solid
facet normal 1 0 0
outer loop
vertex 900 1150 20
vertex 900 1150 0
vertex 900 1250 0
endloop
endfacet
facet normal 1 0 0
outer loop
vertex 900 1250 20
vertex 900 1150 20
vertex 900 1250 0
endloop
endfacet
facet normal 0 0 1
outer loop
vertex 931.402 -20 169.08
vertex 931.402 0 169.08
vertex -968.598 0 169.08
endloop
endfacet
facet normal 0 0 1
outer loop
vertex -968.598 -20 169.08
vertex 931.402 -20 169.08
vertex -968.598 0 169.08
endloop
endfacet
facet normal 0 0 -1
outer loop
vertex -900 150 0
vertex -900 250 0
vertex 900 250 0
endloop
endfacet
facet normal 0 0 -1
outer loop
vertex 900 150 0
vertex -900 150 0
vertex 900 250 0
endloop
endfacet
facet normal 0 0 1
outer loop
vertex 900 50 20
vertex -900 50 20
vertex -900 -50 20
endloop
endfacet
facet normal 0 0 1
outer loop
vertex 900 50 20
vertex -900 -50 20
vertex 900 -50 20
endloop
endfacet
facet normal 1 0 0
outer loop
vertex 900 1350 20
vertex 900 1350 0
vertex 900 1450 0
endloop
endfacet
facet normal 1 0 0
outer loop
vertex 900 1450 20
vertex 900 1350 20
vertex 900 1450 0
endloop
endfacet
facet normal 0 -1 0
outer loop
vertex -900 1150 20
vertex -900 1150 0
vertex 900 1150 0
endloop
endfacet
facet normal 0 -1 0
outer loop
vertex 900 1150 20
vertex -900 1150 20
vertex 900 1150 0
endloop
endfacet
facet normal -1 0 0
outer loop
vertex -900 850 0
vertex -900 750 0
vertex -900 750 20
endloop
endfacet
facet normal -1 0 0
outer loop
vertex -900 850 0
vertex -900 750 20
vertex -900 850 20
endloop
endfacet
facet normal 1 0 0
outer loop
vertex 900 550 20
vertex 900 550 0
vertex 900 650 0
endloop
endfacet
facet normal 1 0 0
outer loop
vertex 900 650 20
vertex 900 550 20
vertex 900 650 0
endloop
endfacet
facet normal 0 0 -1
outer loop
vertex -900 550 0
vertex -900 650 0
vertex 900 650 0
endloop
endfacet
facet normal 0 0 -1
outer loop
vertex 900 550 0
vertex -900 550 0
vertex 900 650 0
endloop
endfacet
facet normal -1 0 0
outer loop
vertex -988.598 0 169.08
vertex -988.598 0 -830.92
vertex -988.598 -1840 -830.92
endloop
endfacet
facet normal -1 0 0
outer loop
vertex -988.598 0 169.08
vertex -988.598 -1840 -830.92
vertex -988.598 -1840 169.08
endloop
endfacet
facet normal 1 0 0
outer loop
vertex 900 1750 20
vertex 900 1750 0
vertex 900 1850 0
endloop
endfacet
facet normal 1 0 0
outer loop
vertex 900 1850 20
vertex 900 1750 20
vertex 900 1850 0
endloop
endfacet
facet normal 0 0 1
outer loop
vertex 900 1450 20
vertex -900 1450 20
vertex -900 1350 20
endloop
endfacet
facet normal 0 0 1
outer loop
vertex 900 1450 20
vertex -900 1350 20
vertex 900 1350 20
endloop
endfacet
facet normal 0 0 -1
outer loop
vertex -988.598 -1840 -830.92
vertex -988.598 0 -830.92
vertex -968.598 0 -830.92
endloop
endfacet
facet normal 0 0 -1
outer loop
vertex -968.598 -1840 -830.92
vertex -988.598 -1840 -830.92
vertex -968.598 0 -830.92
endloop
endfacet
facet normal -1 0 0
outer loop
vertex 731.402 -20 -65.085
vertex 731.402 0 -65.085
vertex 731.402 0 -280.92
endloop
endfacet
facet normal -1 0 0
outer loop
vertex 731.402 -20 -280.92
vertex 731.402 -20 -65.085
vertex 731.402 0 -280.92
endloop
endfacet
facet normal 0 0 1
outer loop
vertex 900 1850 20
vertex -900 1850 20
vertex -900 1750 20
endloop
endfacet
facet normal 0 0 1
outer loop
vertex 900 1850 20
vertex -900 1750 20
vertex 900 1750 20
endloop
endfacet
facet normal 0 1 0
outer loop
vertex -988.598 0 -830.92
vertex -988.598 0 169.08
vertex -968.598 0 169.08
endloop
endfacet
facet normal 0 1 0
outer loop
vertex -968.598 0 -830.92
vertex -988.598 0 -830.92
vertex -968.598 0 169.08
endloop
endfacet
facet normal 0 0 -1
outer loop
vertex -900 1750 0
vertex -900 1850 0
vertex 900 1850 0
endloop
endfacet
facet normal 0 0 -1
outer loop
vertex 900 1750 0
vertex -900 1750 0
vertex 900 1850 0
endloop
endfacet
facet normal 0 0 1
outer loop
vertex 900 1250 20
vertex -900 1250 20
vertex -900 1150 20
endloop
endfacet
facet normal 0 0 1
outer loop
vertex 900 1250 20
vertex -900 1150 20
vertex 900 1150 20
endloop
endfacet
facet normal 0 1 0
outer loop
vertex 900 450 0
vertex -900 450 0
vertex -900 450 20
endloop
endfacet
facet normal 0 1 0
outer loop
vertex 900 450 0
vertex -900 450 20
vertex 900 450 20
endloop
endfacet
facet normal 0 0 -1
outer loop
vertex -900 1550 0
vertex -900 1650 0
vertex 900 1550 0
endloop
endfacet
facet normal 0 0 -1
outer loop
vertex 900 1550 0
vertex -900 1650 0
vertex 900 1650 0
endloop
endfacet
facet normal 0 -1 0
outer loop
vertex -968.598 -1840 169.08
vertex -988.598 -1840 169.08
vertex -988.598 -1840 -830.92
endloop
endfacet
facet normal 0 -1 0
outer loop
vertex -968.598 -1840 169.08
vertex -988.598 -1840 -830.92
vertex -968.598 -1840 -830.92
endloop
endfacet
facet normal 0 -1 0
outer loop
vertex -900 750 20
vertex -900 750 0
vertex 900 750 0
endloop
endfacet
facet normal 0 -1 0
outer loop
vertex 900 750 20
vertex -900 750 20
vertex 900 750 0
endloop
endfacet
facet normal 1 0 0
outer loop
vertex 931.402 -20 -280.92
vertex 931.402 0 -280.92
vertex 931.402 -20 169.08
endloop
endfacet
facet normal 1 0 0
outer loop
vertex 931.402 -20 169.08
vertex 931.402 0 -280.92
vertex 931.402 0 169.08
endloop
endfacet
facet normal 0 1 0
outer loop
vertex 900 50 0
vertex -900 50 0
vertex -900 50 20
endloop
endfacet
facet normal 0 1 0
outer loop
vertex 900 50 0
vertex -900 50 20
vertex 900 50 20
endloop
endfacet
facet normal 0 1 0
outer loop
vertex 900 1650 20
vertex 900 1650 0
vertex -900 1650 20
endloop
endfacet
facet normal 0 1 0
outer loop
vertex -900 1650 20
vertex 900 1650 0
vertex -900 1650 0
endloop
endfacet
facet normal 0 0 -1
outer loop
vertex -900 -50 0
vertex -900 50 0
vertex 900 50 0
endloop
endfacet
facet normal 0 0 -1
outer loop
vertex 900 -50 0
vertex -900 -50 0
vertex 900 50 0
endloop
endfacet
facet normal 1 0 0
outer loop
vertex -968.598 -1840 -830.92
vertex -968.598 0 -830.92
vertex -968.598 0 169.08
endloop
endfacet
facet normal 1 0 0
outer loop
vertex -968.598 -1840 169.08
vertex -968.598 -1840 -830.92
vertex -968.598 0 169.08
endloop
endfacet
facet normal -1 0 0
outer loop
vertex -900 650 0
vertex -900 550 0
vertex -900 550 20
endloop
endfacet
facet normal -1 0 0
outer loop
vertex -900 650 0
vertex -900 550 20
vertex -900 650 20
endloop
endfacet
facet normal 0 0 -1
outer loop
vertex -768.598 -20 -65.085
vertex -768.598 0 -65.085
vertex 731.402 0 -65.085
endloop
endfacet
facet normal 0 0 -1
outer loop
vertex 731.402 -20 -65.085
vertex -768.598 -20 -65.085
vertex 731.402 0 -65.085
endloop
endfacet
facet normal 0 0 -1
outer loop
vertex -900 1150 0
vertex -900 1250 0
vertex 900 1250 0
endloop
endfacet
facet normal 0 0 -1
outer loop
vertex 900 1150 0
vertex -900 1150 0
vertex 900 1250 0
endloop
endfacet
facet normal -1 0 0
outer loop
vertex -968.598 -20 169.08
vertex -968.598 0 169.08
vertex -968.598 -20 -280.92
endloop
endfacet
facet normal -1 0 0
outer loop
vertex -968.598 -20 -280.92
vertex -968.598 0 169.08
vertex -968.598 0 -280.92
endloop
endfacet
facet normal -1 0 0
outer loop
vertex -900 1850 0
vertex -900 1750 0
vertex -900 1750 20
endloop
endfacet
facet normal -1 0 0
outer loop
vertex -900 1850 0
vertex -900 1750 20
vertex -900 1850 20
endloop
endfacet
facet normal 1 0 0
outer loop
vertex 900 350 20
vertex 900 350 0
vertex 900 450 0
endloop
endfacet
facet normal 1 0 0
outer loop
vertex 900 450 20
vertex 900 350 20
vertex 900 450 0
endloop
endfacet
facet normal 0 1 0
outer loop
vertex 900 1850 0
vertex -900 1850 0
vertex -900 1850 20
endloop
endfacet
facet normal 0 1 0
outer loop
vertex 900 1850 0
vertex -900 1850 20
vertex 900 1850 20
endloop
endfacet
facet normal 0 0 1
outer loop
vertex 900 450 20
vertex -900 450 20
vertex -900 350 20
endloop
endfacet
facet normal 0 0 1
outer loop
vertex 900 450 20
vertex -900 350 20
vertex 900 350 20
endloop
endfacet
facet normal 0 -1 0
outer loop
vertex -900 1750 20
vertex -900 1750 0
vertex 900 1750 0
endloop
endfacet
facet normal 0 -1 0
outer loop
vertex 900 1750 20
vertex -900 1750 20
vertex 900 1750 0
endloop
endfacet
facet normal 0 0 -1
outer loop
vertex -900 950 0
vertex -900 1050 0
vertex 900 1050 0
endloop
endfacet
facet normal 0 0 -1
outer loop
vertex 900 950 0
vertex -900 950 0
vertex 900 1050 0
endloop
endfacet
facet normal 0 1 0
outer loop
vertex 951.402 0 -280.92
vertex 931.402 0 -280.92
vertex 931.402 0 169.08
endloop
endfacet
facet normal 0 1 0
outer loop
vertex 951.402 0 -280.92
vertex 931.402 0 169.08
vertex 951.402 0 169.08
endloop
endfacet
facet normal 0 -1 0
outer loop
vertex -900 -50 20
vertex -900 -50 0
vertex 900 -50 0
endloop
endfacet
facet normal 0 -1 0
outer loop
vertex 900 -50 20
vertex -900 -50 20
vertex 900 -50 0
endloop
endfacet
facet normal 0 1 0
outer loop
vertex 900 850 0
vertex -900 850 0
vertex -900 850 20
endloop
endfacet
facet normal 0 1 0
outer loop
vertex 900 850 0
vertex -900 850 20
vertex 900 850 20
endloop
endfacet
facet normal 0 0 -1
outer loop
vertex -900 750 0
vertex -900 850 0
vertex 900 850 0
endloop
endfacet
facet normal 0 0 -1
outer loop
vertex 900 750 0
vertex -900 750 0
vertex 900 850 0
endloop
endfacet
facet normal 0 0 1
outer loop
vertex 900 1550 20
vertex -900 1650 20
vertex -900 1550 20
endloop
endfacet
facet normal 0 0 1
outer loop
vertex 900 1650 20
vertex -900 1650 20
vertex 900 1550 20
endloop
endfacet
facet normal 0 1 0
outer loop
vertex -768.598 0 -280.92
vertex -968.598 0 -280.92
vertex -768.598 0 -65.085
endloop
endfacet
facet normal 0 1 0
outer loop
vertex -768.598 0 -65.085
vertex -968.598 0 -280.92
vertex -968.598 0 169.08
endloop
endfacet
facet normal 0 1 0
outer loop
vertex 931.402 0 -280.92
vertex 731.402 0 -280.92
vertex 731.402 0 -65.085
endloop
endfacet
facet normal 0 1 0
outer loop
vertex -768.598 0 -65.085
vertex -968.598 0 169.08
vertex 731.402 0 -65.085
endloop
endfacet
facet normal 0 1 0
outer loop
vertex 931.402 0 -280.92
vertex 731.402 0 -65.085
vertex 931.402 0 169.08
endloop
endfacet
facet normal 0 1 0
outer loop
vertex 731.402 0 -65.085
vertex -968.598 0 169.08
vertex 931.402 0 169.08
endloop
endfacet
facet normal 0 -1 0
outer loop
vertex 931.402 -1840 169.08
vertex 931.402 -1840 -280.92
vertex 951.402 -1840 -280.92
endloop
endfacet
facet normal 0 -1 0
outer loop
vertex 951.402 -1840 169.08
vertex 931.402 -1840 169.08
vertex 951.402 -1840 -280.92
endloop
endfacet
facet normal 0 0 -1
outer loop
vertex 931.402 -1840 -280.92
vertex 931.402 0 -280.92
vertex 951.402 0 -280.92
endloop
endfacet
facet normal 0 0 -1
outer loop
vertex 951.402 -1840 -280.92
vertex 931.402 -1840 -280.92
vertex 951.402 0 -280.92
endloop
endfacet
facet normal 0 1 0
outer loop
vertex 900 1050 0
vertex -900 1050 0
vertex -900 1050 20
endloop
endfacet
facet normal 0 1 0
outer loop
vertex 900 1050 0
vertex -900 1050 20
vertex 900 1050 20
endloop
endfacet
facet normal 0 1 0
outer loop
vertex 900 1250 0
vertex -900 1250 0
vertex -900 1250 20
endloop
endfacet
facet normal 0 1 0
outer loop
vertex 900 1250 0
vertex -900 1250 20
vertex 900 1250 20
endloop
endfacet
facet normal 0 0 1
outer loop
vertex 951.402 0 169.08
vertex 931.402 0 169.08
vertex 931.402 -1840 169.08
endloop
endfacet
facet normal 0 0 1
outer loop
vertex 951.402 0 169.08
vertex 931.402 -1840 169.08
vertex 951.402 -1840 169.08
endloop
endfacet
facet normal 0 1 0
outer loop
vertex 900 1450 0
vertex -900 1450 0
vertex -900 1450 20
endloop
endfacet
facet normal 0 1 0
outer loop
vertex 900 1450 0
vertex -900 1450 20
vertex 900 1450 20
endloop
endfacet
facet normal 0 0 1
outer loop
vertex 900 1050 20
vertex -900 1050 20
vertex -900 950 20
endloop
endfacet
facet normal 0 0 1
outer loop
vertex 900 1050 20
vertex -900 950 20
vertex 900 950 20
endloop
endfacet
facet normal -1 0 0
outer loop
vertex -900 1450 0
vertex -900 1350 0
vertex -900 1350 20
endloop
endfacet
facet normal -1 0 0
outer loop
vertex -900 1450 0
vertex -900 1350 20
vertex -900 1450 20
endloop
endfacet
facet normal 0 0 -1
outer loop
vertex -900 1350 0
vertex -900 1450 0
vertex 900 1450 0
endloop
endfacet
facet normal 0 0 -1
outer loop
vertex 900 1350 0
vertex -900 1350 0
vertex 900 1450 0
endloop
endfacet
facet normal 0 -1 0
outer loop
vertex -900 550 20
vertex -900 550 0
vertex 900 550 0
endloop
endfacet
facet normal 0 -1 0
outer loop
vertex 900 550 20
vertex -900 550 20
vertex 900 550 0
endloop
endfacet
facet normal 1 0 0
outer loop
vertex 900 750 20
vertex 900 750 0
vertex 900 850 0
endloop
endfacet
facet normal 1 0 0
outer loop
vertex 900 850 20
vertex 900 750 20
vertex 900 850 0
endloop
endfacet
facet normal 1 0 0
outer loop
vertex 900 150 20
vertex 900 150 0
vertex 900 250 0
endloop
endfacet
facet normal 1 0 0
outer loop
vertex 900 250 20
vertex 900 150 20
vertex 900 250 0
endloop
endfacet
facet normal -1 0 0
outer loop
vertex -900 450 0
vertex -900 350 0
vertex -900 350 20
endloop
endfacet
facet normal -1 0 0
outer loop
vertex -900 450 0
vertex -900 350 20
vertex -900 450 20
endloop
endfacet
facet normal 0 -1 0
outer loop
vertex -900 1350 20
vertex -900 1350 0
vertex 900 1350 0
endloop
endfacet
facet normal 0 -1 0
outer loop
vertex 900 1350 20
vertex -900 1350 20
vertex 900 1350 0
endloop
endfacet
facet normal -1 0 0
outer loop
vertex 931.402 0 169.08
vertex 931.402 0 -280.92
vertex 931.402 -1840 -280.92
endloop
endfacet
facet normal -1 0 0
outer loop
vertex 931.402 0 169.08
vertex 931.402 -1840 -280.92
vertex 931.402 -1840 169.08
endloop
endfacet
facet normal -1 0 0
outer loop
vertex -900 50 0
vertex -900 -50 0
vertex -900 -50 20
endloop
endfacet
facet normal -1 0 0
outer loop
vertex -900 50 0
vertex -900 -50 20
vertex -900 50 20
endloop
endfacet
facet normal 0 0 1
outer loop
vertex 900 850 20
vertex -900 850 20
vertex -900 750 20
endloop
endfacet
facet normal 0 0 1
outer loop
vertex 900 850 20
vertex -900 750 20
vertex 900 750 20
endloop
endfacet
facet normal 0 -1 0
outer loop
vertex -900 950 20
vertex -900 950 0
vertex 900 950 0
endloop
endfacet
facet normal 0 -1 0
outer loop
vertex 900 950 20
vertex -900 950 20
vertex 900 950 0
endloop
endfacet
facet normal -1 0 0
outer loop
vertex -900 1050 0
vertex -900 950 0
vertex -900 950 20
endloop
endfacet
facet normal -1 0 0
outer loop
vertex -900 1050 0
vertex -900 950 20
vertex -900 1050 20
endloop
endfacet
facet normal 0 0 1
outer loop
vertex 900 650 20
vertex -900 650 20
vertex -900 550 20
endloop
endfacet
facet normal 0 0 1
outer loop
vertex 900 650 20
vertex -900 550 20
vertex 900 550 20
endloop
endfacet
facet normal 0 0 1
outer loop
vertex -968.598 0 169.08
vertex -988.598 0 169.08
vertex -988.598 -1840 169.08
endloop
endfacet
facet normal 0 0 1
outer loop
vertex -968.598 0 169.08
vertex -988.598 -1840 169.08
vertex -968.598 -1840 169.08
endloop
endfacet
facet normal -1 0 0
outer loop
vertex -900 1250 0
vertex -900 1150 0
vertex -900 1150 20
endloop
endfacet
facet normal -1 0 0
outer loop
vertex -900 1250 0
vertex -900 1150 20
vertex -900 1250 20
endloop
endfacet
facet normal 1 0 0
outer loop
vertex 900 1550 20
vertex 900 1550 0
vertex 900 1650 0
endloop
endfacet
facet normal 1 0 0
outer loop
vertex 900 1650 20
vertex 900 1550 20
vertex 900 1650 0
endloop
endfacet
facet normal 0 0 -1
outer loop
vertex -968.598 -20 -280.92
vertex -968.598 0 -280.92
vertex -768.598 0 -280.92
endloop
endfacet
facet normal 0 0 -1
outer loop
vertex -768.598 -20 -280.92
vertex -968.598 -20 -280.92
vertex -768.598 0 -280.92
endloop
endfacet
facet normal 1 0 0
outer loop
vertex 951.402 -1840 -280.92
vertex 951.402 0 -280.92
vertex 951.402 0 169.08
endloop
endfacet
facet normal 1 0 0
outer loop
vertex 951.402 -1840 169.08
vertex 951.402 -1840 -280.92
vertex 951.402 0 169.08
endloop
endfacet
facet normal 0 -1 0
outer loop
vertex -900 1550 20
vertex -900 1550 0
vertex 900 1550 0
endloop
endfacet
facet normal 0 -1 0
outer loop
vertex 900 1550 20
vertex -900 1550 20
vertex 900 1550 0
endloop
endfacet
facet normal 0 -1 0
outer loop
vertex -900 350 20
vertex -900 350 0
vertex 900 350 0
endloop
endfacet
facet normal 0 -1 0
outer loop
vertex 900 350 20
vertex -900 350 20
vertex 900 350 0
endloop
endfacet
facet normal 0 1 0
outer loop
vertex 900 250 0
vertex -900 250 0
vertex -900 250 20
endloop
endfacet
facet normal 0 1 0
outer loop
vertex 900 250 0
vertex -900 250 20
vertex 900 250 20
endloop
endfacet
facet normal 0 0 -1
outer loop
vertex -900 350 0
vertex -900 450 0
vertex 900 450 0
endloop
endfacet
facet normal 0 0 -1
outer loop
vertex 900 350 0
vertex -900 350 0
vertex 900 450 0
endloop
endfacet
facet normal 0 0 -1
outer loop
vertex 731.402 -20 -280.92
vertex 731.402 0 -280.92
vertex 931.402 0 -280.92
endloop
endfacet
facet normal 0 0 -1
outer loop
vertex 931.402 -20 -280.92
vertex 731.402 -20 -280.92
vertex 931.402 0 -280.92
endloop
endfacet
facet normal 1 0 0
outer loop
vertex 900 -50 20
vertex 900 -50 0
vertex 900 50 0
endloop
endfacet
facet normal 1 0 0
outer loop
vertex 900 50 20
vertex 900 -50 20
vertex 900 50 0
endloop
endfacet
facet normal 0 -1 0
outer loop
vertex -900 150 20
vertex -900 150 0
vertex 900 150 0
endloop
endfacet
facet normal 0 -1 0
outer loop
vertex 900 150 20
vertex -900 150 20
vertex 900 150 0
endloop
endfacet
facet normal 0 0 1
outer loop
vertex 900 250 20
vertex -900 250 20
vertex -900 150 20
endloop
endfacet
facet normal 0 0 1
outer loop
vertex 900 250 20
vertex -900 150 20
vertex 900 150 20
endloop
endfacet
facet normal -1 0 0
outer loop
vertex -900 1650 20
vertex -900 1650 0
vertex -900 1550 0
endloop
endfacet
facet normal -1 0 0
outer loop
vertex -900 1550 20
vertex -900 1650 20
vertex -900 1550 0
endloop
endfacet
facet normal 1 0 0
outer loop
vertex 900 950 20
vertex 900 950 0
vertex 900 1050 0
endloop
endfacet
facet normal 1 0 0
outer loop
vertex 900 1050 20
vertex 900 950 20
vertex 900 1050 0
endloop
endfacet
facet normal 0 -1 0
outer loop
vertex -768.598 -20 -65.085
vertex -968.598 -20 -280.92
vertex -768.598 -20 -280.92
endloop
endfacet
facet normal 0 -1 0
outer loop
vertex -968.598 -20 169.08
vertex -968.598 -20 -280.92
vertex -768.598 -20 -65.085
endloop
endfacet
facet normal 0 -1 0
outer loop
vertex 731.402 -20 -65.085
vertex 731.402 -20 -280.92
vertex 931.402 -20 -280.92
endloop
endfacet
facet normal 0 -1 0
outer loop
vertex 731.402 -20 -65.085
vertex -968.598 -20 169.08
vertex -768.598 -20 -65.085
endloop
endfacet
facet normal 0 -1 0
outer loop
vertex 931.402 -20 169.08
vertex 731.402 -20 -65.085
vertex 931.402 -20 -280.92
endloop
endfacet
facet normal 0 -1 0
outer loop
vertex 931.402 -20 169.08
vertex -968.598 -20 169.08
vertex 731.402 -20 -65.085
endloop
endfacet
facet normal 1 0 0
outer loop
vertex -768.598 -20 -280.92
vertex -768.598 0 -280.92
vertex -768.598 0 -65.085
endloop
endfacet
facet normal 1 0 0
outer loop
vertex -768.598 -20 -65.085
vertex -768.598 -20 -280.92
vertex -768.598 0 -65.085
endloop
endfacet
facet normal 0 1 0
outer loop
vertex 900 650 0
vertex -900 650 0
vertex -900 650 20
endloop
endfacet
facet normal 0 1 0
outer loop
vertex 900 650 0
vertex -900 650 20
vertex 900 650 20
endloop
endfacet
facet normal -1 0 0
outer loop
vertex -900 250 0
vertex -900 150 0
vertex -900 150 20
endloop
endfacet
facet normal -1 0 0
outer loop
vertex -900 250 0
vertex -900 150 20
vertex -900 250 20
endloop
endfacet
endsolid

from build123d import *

# Parameters (mm, degrees)
F1_DEPTH = 20
F2_W     = 1800
F2_H     = 100
F3_DEPTH = 20
F4_W     = 20
F4_H     = 1000
F4_H_2   = 450
F5_DEPTH = 1840


with BuildPart() as f1:
    # F0 (on Front) → F1 (new body)
    with BuildSketch(Plane.XZ):
        Polygon((931.401536, 169.080263), (-968.598464, 169.080263), (-968.598464, -280.919737), (-768.598464, -280.919737), (-768.598464, -65.084957), (731.401536, -65.084957), (731.401536, -280.919737), (931.401536, -280.919737), align=None)
    extrude(amount=F1_DEPTH)


with BuildPart() as f3:
    # F2 (on Top) → F3 (new body)
    with BuildSketch(Plane.XY):
        with Locations((0, 1800)):
            Rectangle(F2_W, F2_H)
        Polygon((-900, 1550), (900, 1550), (900, 1650.000024), (-900, 1650), align=None)
        with Locations((0, 1400)):
            Rectangle(F2_W, F2_H)
        with Locations((0, 1200)):
            Rectangle(F2_W, F2_H)
        with Locations((0, 1000)):
            Rectangle(F2_W, F2_H)
        with Locations((0, 800)):
            Rectangle(F2_W, F2_H)
        with Locations((0, 600)):
            Rectangle(F2_W, F2_H)
        with Locations((0, 400)):
            Rectangle(F2_W, F2_H)
        with Locations((0, 200)):
            Rectangle(F2_W, F2_H)
        Rectangle(F2_W, F2_H)
    extrude(amount=F3_DEPTH)


with BuildPart() as f5:
    # F4 (on Front) → F5 (new body)
    with BuildSketch(Plane.XZ):
        with Locations((-978.598464, -330.919737)):
            Rectangle(F4_W, F4_H)
        with Locations((941.401536, -55.919737)):
            Rectangle(F4_W, F4_H_2)
    extrude(amount=F5_DEPTH)


solid = Compound([f1.part, f3.part, f5.part])
